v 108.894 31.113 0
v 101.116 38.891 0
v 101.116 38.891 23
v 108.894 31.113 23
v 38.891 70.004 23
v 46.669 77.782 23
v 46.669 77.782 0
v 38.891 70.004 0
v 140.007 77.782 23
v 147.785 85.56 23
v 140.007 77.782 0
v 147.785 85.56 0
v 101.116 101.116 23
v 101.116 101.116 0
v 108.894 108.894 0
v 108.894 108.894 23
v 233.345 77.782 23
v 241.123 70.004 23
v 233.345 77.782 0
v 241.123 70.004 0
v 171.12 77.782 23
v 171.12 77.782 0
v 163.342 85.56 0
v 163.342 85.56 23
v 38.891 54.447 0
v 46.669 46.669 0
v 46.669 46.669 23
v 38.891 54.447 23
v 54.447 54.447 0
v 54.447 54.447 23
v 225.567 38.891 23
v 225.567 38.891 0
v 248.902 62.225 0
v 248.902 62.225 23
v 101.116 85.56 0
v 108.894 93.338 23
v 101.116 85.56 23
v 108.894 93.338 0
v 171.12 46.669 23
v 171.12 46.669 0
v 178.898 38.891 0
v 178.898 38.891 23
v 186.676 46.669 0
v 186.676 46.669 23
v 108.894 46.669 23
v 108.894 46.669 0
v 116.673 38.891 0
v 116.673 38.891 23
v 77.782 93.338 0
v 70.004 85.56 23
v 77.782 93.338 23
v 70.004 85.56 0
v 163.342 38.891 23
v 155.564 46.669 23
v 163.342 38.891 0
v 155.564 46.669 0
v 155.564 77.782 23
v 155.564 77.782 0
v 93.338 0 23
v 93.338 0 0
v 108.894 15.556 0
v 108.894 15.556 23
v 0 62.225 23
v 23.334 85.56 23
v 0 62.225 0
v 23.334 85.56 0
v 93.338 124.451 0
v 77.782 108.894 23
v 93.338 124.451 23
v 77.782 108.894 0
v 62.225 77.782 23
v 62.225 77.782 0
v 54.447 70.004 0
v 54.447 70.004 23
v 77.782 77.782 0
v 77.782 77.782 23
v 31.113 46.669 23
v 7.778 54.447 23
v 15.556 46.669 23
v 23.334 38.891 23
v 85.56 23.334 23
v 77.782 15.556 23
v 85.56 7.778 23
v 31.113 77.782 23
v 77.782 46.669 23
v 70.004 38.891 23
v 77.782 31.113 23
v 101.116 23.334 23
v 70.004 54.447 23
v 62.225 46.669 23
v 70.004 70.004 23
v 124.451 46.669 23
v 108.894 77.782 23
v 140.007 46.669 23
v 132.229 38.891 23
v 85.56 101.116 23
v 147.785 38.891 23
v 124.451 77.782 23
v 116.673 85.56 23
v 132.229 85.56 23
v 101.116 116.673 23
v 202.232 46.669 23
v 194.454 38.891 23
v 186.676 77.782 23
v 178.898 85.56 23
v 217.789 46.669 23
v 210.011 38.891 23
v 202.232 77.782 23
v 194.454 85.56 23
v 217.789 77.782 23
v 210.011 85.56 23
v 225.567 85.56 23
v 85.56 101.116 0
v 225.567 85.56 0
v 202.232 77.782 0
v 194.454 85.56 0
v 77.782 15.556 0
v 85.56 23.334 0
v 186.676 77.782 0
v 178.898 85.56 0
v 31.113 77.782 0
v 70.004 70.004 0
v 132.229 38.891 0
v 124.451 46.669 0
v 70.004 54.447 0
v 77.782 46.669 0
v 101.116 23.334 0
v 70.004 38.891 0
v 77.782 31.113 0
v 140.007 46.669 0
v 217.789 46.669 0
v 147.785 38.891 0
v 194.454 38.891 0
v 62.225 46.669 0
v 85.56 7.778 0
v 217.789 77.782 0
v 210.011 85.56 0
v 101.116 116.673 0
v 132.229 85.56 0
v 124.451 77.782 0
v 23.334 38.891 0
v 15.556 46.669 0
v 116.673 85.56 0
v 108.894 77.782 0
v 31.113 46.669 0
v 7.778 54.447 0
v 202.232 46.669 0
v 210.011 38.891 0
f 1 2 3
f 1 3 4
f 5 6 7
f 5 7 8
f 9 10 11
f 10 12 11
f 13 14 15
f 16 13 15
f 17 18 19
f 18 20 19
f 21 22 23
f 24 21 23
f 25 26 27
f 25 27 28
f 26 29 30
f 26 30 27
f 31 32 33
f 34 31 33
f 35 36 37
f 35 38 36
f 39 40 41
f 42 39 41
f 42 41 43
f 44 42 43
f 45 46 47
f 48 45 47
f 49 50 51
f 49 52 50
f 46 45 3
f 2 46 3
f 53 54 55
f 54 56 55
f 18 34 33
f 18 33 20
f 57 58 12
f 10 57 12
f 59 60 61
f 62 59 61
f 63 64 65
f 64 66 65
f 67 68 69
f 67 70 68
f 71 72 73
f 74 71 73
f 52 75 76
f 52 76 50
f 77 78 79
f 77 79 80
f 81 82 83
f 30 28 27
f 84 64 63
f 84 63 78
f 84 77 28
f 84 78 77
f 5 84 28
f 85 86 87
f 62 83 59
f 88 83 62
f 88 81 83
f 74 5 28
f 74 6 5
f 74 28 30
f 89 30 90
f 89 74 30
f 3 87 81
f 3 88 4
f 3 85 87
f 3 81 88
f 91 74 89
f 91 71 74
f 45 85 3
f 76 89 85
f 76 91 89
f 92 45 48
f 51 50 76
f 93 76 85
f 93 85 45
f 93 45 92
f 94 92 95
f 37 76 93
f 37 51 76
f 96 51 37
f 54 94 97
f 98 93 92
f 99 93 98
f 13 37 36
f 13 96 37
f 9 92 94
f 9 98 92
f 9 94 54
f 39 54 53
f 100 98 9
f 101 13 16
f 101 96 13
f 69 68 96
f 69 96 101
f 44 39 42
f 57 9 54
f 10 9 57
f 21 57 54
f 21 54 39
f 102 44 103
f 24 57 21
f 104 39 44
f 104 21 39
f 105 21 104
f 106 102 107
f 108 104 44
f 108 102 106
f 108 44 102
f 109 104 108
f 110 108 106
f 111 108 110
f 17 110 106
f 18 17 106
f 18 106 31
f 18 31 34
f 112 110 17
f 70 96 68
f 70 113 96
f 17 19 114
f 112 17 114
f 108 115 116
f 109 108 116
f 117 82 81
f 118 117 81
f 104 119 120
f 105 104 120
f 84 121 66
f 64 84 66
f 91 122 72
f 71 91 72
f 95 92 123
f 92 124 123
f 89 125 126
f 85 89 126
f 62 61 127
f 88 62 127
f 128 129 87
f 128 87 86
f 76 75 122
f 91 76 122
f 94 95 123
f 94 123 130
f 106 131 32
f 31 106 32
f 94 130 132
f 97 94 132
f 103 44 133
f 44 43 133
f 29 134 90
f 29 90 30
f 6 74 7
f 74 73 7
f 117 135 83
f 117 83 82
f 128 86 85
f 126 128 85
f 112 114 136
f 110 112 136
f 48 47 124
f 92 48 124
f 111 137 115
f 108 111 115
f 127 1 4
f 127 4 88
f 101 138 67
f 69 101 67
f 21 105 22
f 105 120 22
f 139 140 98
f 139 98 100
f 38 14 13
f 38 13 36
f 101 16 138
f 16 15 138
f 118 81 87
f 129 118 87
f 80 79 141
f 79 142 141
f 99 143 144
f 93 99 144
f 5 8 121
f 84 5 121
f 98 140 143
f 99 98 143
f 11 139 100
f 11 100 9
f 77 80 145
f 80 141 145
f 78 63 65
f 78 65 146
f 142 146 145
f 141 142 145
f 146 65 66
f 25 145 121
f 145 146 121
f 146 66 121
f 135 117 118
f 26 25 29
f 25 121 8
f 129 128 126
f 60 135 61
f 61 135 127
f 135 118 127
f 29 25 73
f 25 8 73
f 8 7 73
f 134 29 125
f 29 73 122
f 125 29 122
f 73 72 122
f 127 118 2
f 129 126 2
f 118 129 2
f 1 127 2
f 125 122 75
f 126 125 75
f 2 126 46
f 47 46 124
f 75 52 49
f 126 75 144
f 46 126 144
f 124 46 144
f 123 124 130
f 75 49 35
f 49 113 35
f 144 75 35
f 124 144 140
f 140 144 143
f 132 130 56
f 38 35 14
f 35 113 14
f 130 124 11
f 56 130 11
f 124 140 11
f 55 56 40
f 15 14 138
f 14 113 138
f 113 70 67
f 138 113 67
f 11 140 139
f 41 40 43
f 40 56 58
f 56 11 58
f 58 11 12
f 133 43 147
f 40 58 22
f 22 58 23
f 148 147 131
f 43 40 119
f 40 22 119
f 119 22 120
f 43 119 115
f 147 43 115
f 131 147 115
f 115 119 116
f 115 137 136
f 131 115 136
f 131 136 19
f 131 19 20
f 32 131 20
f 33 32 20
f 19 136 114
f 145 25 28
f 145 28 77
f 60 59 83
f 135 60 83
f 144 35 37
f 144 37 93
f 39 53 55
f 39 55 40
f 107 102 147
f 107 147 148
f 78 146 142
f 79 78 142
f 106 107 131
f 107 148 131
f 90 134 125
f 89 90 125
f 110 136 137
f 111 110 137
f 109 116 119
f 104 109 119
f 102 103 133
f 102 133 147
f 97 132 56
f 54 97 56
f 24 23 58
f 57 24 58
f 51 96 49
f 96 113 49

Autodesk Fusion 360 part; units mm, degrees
sketch "big huge diamond sword" plane through (0, 0, 0) normal (0, 0, 1) x (1, 0, 0)
  line L0 (0, 62.2254) -> (7.7782, 54.4472)
  line L1 (7.7782, 54.4472) -> (15.5563, 62.2254)
  line L2 (15.5563, 62.2254) -> (7.7782, 70.0036)
  line L3 (7.7782, 70.0036) -> (0, 62.2254)
  line L4 (7.7782, 54.4472) -> (15.5563, 46.669)
  line L5 (15.5563, 46.669) -> (23.3345, 54.4472)
  line L6 (23.3345, 54.4472) -> (15.5563, 62.2254)
  line L7 (15.5563, 62.2254) -> (7.7782, 54.4472)
  line L8 (15.5563, 46.669) -> (23.3345, 38.8909)
  line L9 (23.3345, 38.8909) -> (31.1127, 46.669)
  line L10 (23.3345, 54.4472) -> (15.5563, 46.669)
  line L11 (7.7782, 70.0036) -> (15.5563, 62.2254)
  line L12 (15.5563, 62.2254) -> (23.3345, 70.0036)
  line L13 (23.3345, 70.0036) -> (15.5563, 77.7817)
  line L14 (15.5563, 77.7817) -> (7.7782, 70.0036)
  line L15 (23.3345, 70.0036) -> (31.1127, 62.2254)
  line L16 (31.1127, 62.2254) -> (23.3345, 54.4472)
  line L17 (23.3345, 54.4472) -> (15.5563, 62.2254)
  line L18 (15.5563, 62.2254) -> (23.3345, 70.0036)
  line L19 (15.5563, 77.7817) -> (23.3345, 70.0036)
  line L20 (23.3345, 70.0036) -> (31.1127, 77.7817)
  line L21 (31.1127, 77.7817) -> (23.3345, 85.5599)
  line L22 (23.3345, 85.5599) -> (15.5563, 77.7817)
  line L23 (23.3345, 70.0036) -> (31.1127, 62.2254)
  line L24 (31.1127, 62.2254) -> (38.8909, 70.0036)
  line L25 (38.8909, 70.0036) -> (31.1127, 77.7817)
  line L26 (31.1127, 77.7817) -> (23.3345, 70.0036)
  line L27 (31.1127, 62.2254) -> (38.8909, 54.4472)
  line L28 (38.8909, 54.4472) -> (31.1127, 46.669)
  line L29 (31.1127, 46.669) -> (23.3345, 54.4472)
  line L30 (23.3345, 54.4472) -> (31.1127, 62.2254)
  line L31 (31.1127, 62.2254) -> (38.8909, 54.4472)
  line L32 (38.8909, 54.4472) -> (46.669, 62.2254)
  line L33 (46.669, 62.2254) -> (38.8909, 70.0036)
  line L34 (38.8909, 70.0036) -> (31.1127, 62.2254)
  line L35 (38.8909, 70.0036) -> (46.669, 62.2254)
  line L36 (46.669, 62.2254) -> (54.4472, 70.0036)
  line L37 (54.4472, 70.0036) -> (46.669, 77.7817)
  line L38 (46.669, 77.7817) -> (38.8909, 70.0036)
  line L39 (46.669, 62.2254) -> (54.4472, 54.4472)
  line L40 (54.4472, 54.4472) -> (46.669, 46.669)
  line L41 (46.669, 46.669) -> (38.8909, 54.4472)
  line L42 (38.8909, 54.4472) -> (46.669, 62.2254)
  line L43 (46.669, 62.2254) -> (54.4472, 54.4472)
  line L44 (54.4472, 54.4472) -> (62.2254, 62.2254)
  line L45 (62.2254, 62.2254) -> (54.4472, 70.0036)
  line L46 (54.4472, 70.0036) -> (46.669, 62.2254)
  line L47 (54.4472, 70.0036) -> (62.2254, 62.2254)
  line L48 (62.2254, 62.2254) -> (70.0036, 70.0036)
  line L49 (70.0036, 70.0036) -> (62.2254, 77.7817)
  line L50 (62.2254, 77.7817) -> (54.4472, 70.0036)
  line L51 (62.2254, 62.2254) -> (70.0036, 54.4472)
  line L52 (62.2254, 46.669) -> (54.4472, 54.4472)
  line L53 (54.4472, 54.4472) -> (62.2254, 62.2254)
  line L54 (62.2254, 62.2254) -> (70.0036, 54.4472)
  line L55 (70.0036, 54.4472) -> (77.7817, 62.2254)
  line L56 (77.7817, 62.2254) -> (70.0036, 70.0036)
  line L57 (70.0036, 70.0036) -> (62.2254, 62.2254)
  line L58 (70.0036, 70.0036) -> (77.7817, 62.2254)
  line L59 (77.7817, 62.2254) -> (85.5599, 70.0036)
  line L60 (85.5599, 70.0036) -> (77.7817, 77.7817)
  line L61 (77.7817, 77.7817) -> (70.0036, 70.0036)
  line L62 (77.7817, 77.7817) -> (70.0036, 85.5599)
  line L63 (70.0036, 85.5599) -> (77.7817, 93.3381)
  line L64 (77.7817, 93.3381) -> (85.5599, 85.5599)
  line L65 (85.5599, 85.5599) -> (77.7817, 77.7817)
  line L66 (77.7817, 93.3381) -> (85.5599, 85.5599)
  line L67 (85.5599, 85.5599) -> (93.3381, 93.3381)
  line L68 (93.3381, 93.3381) -> (85.5599, 101.1163)
  line L69 (85.5599, 101.1163) -> (77.7817, 93.3381)
  line L70 (85.5599, 101.1163) -> (77.7817, 108.8944)
  line L71 (77.7817, 108.8944) -> (85.5599, 116.6726)
  line L72 (85.5599, 116.6726) -> (93.3381, 108.8944)
  line L73 (93.3381, 108.8944) -> (85.5599, 101.1163)
  line L74 (85.5599, 116.6726) -> (93.3381, 108.8944)
  line L75 (93.3381, 108.8944) -> (101.1163, 116.6726)
  line L76 (101.1163, 116.6726) -> (93.3381, 124.4508)
  line L77 (93.3381, 124.4508) -> (85.5599, 116.6726)
  line L78 (93.3381, 108.8944) -> (101.1163, 101.1163)
  line L79 (101.1163, 101.1163) -> (108.8944, 108.8944)
  line L80 (108.8944, 108.8944) -> (101.1163, 116.6726)
  line L81 (101.1163, 116.6726) -> (93.3381, 108.8944)
  line L82 (85.5599, 101.1163) -> (93.3381, 93.3381)
  line L83 (93.3381, 93.3381) -> (101.1163, 101.1163)
  line L84 (101.1163, 101.1163) -> (93.3381, 108.8944)
  line L85 (93.3381, 108.8944) -> (85.5599, 101.1163)
  line L86 (101.1163, 101.1163) -> (108.8944, 93.3381)
  line L87 (108.8944, 93.3381) -> (101.1163, 85.5599)
  line L88 (101.1163, 85.5599) -> (93.3381, 93.3381)
  line L89 (93.3381, 93.3381) -> (101.1163, 101.1163)
  line L90 (93.3381, 93.3381) -> (101.1163, 85.5599)
  line L91 (101.1163, 85.5599) -> (93.3381, 77.7817)
  line L92 (93.3381, 77.7817) -> (85.5599, 85.5599)
  line L93 (85.5599, 85.5599) -> (93.3381, 93.3381)
  line L94 (77.7817, 77.7817) -> (85.5599, 70.0036)
  line L95 (85.5599, 70.0036) -> (93.3381, 77.7817)
  line L96 (93.3381, 77.7817) -> (85.5599, 85.5599)
  line L97 (85.5599, 85.5599) -> (77.7817, 77.7817)
  line L98 (70.0036, 54.4472) -> (77.7817, 46.669)
  line L99 (62.2254, 46.669) -> (70.0036, 54.4472)
  line L100 (77.7817, 62.2254) -> (85.5599, 54.4472)
  line L101 (85.5599, 54.4472) -> (77.7817, 46.669)
  line L102 (70.0036, 54.4472) -> (77.7817, 62.2254)
  line L103 (85.5599, 70.0036) -> (93.3381, 62.2254)
  line L104 (93.3381, 62.2254) -> (85.5599, 54.4472)
  line L105 (85.5599, 54.4472) -> (77.7817, 62.2254)
  line L106 (77.7817, 62.2254) -> (85.5599, 70.0036)
  line L107 (77.7817, 46.669) -> (85.5599, 38.8909)
  line L108 (85.5599, 38.8909) -> (77.7817, 31.1127)
  line L109 (77.7817, 31.1127) -> (70.0036, 38.8909)
  line L110 (70.0036, 38.8909) -> (77.7817, 46.669)
  line L111 (77.7817, 46.669) -> (85.5599, 38.8909)
  line L112 (85.5599, 38.8909) -> (93.3381, 46.669)
  line L113 (93.3381, 46.669) -> (85.5599, 54.4472)
  line L114 (85.5599, 54.4472) -> (77.7817, 46.669)
  line L115 (85.5599, 38.8909) -> (93.3381, 31.1127)
  line L116 (93.3381, 31.1127) -> (85.5599, 23.3345)
  line L117 (85.5599, 23.3345) -> (77.7817, 31.1127)
  line L118 (77.7817, 31.1127) -> (85.5599, 38.8909)
  line L119 (85.5599, 23.3345) -> (93.3381, 15.5563)
  line L120 (93.3381, 15.5563) -> (101.1163, 23.3345)
  line L121 (101.1163, 23.3345) -> (93.3381, 31.1127)
  line L122 (93.3381, 31.1127) -> (85.5599, 23.3345)
  line L123 (93.3381, 15.5563) -> (101.1163, 7.7782)
  line L124 (101.1163, 7.7782) -> (108.8944, 15.5563)
  line L125 (108.8944, 15.5563) -> (101.1163, 23.3345)
  line L126 (101.1163, 23.3345) -> (93.3381, 15.5563)
  line L127 (85.5599, 23.3345) -> (93.3381, 15.5563)
  line L128 (93.3381, 15.5563) -> (85.5599, 7.7782)
  line L129 (85.5599, 7.7782) -> (77.7817, 15.5563)
  line L130 (77.7817, 15.5563) -> (85.5599, 23.3345)
  line L131 (93.3381, 15.5563) -> (101.1163, 7.7782)
  line L132 (101.1163, 7.7782) -> (93.3381, 0)
  line L133 (93.3381, 0) -> (85.5599, 7.7782)
  line L134 (85.5599, 7.7782) -> (93.3381, 15.5563)
  line L135 (93.3381, 77.7817) -> (101.1163, 70.0036)
  line L136 (101.1163, 70.0036) -> (93.3381, 62.2254)
  line L137 (93.3381, 62.2254) -> (85.5599, 70.0036)
  line L138 (85.5599, 70.0036) -> (93.3381, 77.7817)
  line L139 (93.3381, 62.2254) -> (101.1163, 54.4472)
  line L140 (101.1163, 54.4472) -> (93.3381, 46.669)
  line L141 (93.3381, 46.669) -> (85.5599, 54.4472)
  line L142 (85.5599, 54.4472) -> (93.3381, 62.2254)
  line L143 (101.1163, 85.5599) -> (108.8944, 77.7817)
  line L144 (108.8944, 77.7817) -> (101.1163, 70.0036)
  line L145 (101.1163, 70.0036) -> (93.3381, 77.7817)
  line L146 (93.3381, 77.7817) -> (101.1163, 85.5599)
  line L147 (101.1163, 70.0036) -> (108.8944, 62.2254)
  line L148 (108.8944, 62.2254) -> (101.1163, 54.4472)
  line L149 (101.1163, 54.4472) -> (93.3381, 62.2254)
  line L150 (93.3381, 62.2254) -> (101.1163, 70.0036)
  line L151 (108.8944, 77.7817) -> (116.6726, 70.0036)
  line L152 (116.6726, 70.0036) -> (108.8944, 62.2254)
  line L153 (108.8944, 62.2254) -> (101.1163, 70.0036)
  line L154 (101.1163, 70.0036) -> (108.8944, 77.7817)
  line L155 (93.3381, 46.669) -> (101.1163, 38.8909)
  line L156 (101.1163, 38.8909) -> (93.3381, 31.1127)
  line L157 (93.3381, 31.1127) -> (85.5599, 38.8909)
  line L158 (85.5599, 38.8909) -> (93.3381, 46.669)
  line L159 (101.1163, 38.8909) -> (108.8944, 31.1127)
  line L160 (108.8944, 31.1127) -> (101.1163, 23.3345)
  line L161 (101.1163, 23.3345) -> (93.3381, 31.1127)
  line L162 (93.3381, 31.1127) -> (101.1163, 38.8909)
  line L163 (101.1163, 54.4472) -> (108.8944, 46.669)
  line L164 (108.8944, 46.669) -> (101.1163, 38.8909)
  line L165 (101.1163, 38.8909) -> (93.3381, 46.669)
  line L166 (93.3381, 46.669) -> (101.1163, 54.4472)
  line L167 (108.8944, 62.2254) -> (116.6726, 54.4472)
  line L168 (116.6726, 54.4472) -> (108.8944, 46.669)
  line L169 (108.8944, 46.669) -> (101.1163, 54.4472)
  line L170 (101.1163, 54.4472) -> (108.8944, 62.2254)
  line L171 (108.8944, 46.669) -> (101.1163, 54.4472)
  line L172 (101.1163, 54.4472) -> (108.8944, 62.2254)
  line L173 (108.8944, 62.2254) -> (116.6726, 54.4472)
  line L174 (116.6726, 54.4472) -> (108.8944, 46.669)
  line L175 (108.8944, 46.669) -> (116.6726, 38.8909)
  line L176 (116.6726, 38.8909) -> (124.4508, 46.669)
  line L177 (124.4508, 46.669) -> (116.6726, 54.4472)
  line L178 (116.6726, 54.4472) -> (108.8944, 46.669)
  line L179 (108.8944, 62.2254) -> (116.6726, 54.4472)
  line L180 (116.6726, 54.4472) -> (124.4508, 62.2254)
  line L181 (124.4508, 62.2254) -> (116.6726, 70.0036)
  line L182 (116.6726, 70.0036) -> (108.8944, 62.2254)
  line L183 (116.6726, 54.4472) -> (124.4508, 46.669)
  line L184 (124.4508, 46.669) -> (132.229, 54.4472)
  line L185 (132.229, 54.4472) -> (124.4508, 62.2254)
  line L186 (124.4508, 62.2254) -> (116.6726, 54.4472)
  line L187 (124.4508, 46.669) -> (132.229, 38.8909)
  line L188 (132.229, 38.8909) -> (140.0071, 46.669)
  line L189 (140.0071, 46.669) -> (132.229, 54.4472)
  line L190 (132.229, 54.4472) -> (124.4508, 46.669)
  line L191 (108.8944, 77.7817) -> (116.6726, 70.0036)
  line L192 (116.6726, 70.0036) -> (124.4508, 77.7817)
  line L193 (124.4508, 77.7817) -> (116.6726, 85.5599)
  line L194 (116.6726, 85.5599) -> (108.8944, 77.7817)
  line L195 (116.6726, 70.0036) -> (124.4508, 62.2254)
  line L196 (124.4508, 62.2254) -> (132.229, 70.0036)
  line L197 (132.229, 70.0036) -> (124.4508, 77.7817)
  line L198 (124.4508, 77.7817) -> (116.6726, 70.0036)
  line L199 (132.229, 70.0036) -> (124.4508, 77.7817)
  line L200 (124.4508, 77.7817) -> (132.229, 85.5599)
  line L201 (132.229, 85.5599) -> (140.0071, 77.7817)
  line L202 (140.0071, 77.7817) -> (132.229, 70.0036)
  line L203 (124.4508, 62.2254) -> (132.229, 54.4472)
  line L204 (132.229, 54.4472) -> (140.0071, 62.2254)
  line L205 (140.0071, 62.2254) -> (132.229, 70.0036)
  line L206 (132.229, 70.0036) -> (124.4508, 62.2254)
  line L207 (132.229, 70.0036) -> (140.0071, 62.2254)
  line L208 (140.0071, 62.2254) -> (147.7853, 70.0036)
  line L209 (147.7853, 70.0036) -> (140.0071, 77.7817)
  line L210 (140.0071, 77.7817) -> (132.229, 70.0036)
  line L211 (132.229, 54.4472) -> (140.0071, 46.669)
  line L212 (140.0071, 46.669) -> (147.7853, 54.4472)
  line L213 (147.7853, 54.4472) -> (140.0071, 62.2254)
  line L214 (140.0071, 62.2254) -> (132.229, 54.4472)
  line L215 (140.0071, 77.7817) -> (147.7853, 70.0036)
  line L216 (147.7853, 70.0036) -> (155.5635, 77.7817)
  line L217 (155.5635, 77.7817) -> (147.7853, 85.5599)
  line L218 (147.7853, 85.5599) -> (140.0071, 77.7817)
  line L219 (140.0071, 46.669) -> (147.7853, 38.8909)
  line L220 (147.7853, 38.8909) -> (155.5635, 46.669)
  line L221 (155.5635, 46.669) -> (147.7853, 54.4472)
  line L222 (147.7853, 54.4472) -> (140.0071, 46.669)
  line L223 (140.0071, 62.2254) -> (147.7853, 54.4472)
  line L224 (147.7853, 54.4472) -> (155.5635, 62.2254)
  line L225 (155.5635, 62.2254) -> (147.7853, 70.0036)
  line L226 (147.7853, 70.0036) -> (140.0071, 62.2254)
  line L227 (155.5635, 62.2254) -> (163.3417, 54.4472)
  line L228 (163.3417, 54.4472) -> (171.1198, 62.2254)
  line L229 (171.1198, 62.2254) -> (163.3417, 70.0036)
  line L230 (163.3417, 70.0036) -> (155.5635, 62.2254)
  line L231 (155.5635, 62.2254) -> (147.7853, 70.0036)
  line L232 (147.7853, 70.0036) -> (155.5635, 77.7817)
  line L233 (155.5635, 77.7817) -> (163.3417, 70.0036)
  line L234 (163.3417, 70.0036) -> (155.5635, 62.2254)
  line L235 (155.5635, 62.2254) -> (163.3417, 54.4472)
  line L236 (163.3417, 54.4472) -> (155.5635, 46.669)
  line L237 (155.5635, 46.669) -> (147.7853, 54.4472)
  line L238 (147.7853, 54.4472) -> (155.5635, 62.2254)
  line L239 (155.5635, 77.7817) -> (163.3417, 70.0036)
  line L240 (163.3417, 70.0036) -> (171.1198, 77.7817)
  line L241 (171.1198, 77.7817) -> (163.3417, 85.5599)
  line L242 (163.3417, 85.5599) -> (155.5635, 77.7817)
  line L243 (163.3417, 70.0036) -> (171.1198, 62.2254)
  line L244 (171.1198, 62.2254) -> (178.898, 70.0036)
  line L245 (178.898, 70.0036) -> (171.1198, 77.7817)
  line L246 (171.1198, 77.7817) -> (163.3417, 70.0036)
  line L247 (155.5635, 46.669) -> (163.3417, 38.8909)
  line L248 (163.3417, 38.8909) -> (171.1198, 46.669)
  line L249 (171.1198, 46.669) -> (163.3417, 54.4472)
  line L250 (163.3417, 54.4472) -> (155.5635, 46.669)
  line L251 (163.3417, 54.4472) -> (171.1198, 46.669)
  line L252 (171.1198, 46.669) -> (178.898, 54.4472)
  line L253 (178.898, 54.4472) -> (171.1198, 62.2254)
  line L254 (171.1198, 62.2254) -> (163.3417, 54.4472)
  line L255 (171.1198, 62.2254) -> (178.898, 54.4472)
  line L256 (178.898, 54.4472) -> (186.6762, 62.2254)
  line L257 (186.6762, 62.2254) -> (178.898, 70.0036)
  line L258 (178.898, 70.0036) -> (171.1198, 62.2254)
  line L259 (171.1198, 77.7817) -> (178.898, 70.0036)
  line L260 (178.898, 70.0036) -> (186.6762, 77.7817)
  line L261 (186.6762, 77.7817) -> (178.898, 85.5599)
  line L262 (178.898, 85.5599) -> (171.1198, 77.7817)
  line L263 (171.1198, 46.669) -> (178.898, 38.8909)
  line L264 (178.898, 38.8909) -> (186.6762, 46.669)
  line L265 (186.6762, 46.669) -> (178.898, 54.4472)
  line L266 (178.898, 54.4472) -> (171.1198, 46.669)
  line L267 (178.898, 70.0036) -> (186.6762, 62.2254)
  line L268 (186.6762, 62.2254) -> (194.4544, 70.0036)
  line L269 (194.4544, 70.0036) -> (186.6762, 77.7817)
  line L270 (186.6762, 77.7817) -> (178.898, 70.0036)
  line L271 (178.898, 54.4472) -> (186.6762, 46.669)
  line L272 (186.6762, 46.669) -> (194.4544, 54.4472)
  line L273 (194.4544, 54.4472) -> (186.6762, 62.2254)
  line L274 (186.6762, 62.2254) -> (178.898, 54.4472)
  line L275 (186.6762, 62.2254) -> (194.4544, 54.4472)
  line L276 (194.4544, 54.4472) -> (202.2325, 62.2254)
  line L277 (202.2325, 62.2254) -> (194.4544, 70.0036)
  line L278 (194.4544, 70.0036) -> (186.6762, 62.2254)
  line L279 (186.6762, 46.669) -> (194.4544, 38.8909)
  line L280 (194.4544, 38.8909) -> (202.2325, 46.669)
  line L281 (202.2325, 46.669) -> (194.4544, 54.4472)
  line L282 (194.4544, 54.4472) -> (186.6762, 46.669)
  line L283 (186.6762, 77.7817) -> (194.4544, 70.0036)
  line L284 (194.4544, 70.0036) -> (202.2325, 77.7817)
  line L285 (202.2325, 77.7817) -> (194.4544, 85.5599)
  line L286 (194.4544, 85.5599) -> (186.6762, 77.7817)
  line L287 (202.2325, 62.2254) -> (210.0107, 54.4472)
  line L288 (210.0107, 54.4472) -> (202.2325, 46.669)
  line L289 (202.2325, 46.669) -> (194.4544, 54.4472)
  line L290 (194.4544, 54.4472) -> (202.2325, 62.2254)
  line L291 (194.4544, 70.0036) -> (202.2325, 62.2254)
  line L292 (202.2325, 62.2254) -> (210.0107, 70.0036)
  line L293 (210.0107, 70.0036) -> (202.2325, 77.7817)
  line L294 (202.2325, 77.7817) -> (194.4544, 70.0036)
  line L295 (202.2325, 62.2254) -> (210.0107, 54.4472)
  line L296 (210.0107, 54.4472) -> (217.7889, 62.2254)
  line L297 (217.7889, 62.2254) -> (210.0107, 70.0036)
  line L298 (210.0107, 70.0036) -> (202.2325, 62.2254)
  line L299 (202.2325, 46.669) -> (210.0107, 38.8909)
  line L300 (210.0107, 38.8909) -> (217.7889, 46.669)
  line L301 (217.7889, 46.669) -> (210.0107, 54.4472)
  line L302 (210.0107, 54.4472) -> (202.2325, 46.669)
  line L303 (202.2325, 77.7817) -> (210.0107, 70.0036)
  line L304 (210.0107, 70.0036) -> (217.7889, 77.7817)
  line L305 (217.7889, 77.7817) -> (210.0107, 85.5599)
  line L306 (210.0107, 85.5599) -> (202.2325, 77.7817)
  line L307 (217.7889, 77.7817) -> (225.5671, 70.0036)
  line L308 (225.5671, 70.0036) -> (217.7889, 62.2254)
  line L309 (217.7889, 62.2254) -> (210.0107, 70.0036)
  line L310 (210.0107, 70.0036) -> (217.7889, 77.7817)
  line L311 (210.0107, 54.4472) -> (217.7889, 46.669)
  line L312 (217.7889, 46.669) -> (225.5671, 54.4472)
  line L313 (225.5671, 54.4472) -> (217.7889, 62.2254)
  line L314 (217.7889, 62.2254) -> (210.0107, 54.4472)
  line L315 (217.7889, 62.2254) -> (225.5671, 54.4472)
  line L316 (225.5671, 54.4472) -> (233.3452, 62.2254)
  line L317 (233.3452, 62.2254) -> (225.5671, 70.0036)
  line L318 (225.5671, 70.0036) -> (217.7889, 62.2254)
  line L319 (217.7889, 77.7817) -> (225.5671, 70.0036)
  line L320 (225.5671, 70.0036) -> (233.3452, 77.7817)
  line L321 (233.3452, 77.7817) -> (225.5671, 85.5599)
  line L322 (225.5671, 85.5599) -> (217.7889, 77.7817)
  line L323 (225.5671, 70.0036) -> (233.3452, 62.2254)
  line L324 (233.3452, 62.2254) -> (241.1234, 70.0036)
  line L325 (241.1234, 70.0036) -> (233.3452, 77.7817)
  line L326 (233.3452, 77.7817) -> (225.5671, 70.0036)
  line L327 (217.7889, 46.669) -> (225.5671, 38.8909)
  line L328 (225.5671, 38.8909) -> (233.3452, 46.669)
  line L329 (233.3452, 46.669) -> (225.5671, 54.4472)
  line L330 (225.5671, 54.4472) -> (217.7889, 46.669)
  line L331 (225.5671, 54.4472) -> (233.3452, 46.669)
  line L332 (233.3452, 46.669) -> (241.1234, 54.4472)
  line L333 (241.1234, 54.4472) -> (233.3452, 62.2254)
  line L334 (233.3452, 62.2254) -> (225.5671, 54.4472)
  line L335 (233.3452, 62.2254) -> (225.5671, 70.0036)
  line L336 (225.5671, 70.0036) -> (233.3452, 77.7817)
  line L337 (233.3452, 77.7817) -> (241.1234, 70.0036)
  line L338 (241.1234, 70.0036) -> (233.3452, 62.2254)
  line L339 (233.3452, 62.2254) -> (241.1234, 54.4472)
  line L340 (241.1234, 54.4472) -> (248.9016, 62.2254)
  line L341 (248.9016, 62.2254) -> (241.1234, 70.0036)
  line L342 (241.1234, 70.0036) -> (233.3452, 62.2254)
  circle A0 centre (10, 10) radius 2.05
  circle A1 centre (200, 10) radius 2.05
  line L343 (0, 62.2254) -> (248.9016, 62.2254) construction
  circle A2 centre (200, 114.4508) radius 2.05
  point P0 (10, 114.4508)
  dimension "d249" = 11
  dimension "d250" = 11
  dimension "d251" = 11
  dimension "d252" = 11
  dimension "d253" = 11
  dimension "d254" = 11
  dimension "d255" = 11
  dimension "d256" = 11
  dimension "d261" = 11
  dimension "d262" = 11
  dimension "d263" = 11
  dimension "d264" = 11
  dimension "d265" = 11
  dimension "d266" = 11
  dimension "d267" = 11
  dimension "d268" = 11
  dimension "d271" = 11
  dimension "d272" = 11
  dimension "d273" = 11
  dimension "d274" = 11
  dimension "d275" = 11
  dimension "d276" = 11
  dimension "d277" = 11
  dimension "d278" = 11
  dimension "d279" = 11
  dimension "d280" = 11
  dimension "d281" = 11
  dimension "d282" = 11
  dimension "d283" = 11
  dimension "d284" = 11
  dimension "d285" = 11
  dimension "d286" = 11
  dimension "d287" = 11
  dimension "d288" = 11
  dimension "d289" = 11
  dimension "d290" = 11
  dimension "d291" = 11
  dimension "d292" = 11
  dimension "d293" = 11
  dimension "d294" = 11
  dimension "d295" = 11
  dimension "d296" = 11
  dimension "d297" = 11
  dimension "d298" = 11
  dimension "d299" = 11
  dimension "d300" = 11
  dimension "d301" = 11
  dimension "d302" = 11
  dimension "d303" = 11
  dimension "d304" = 11
  dimension "d309" = 11
  dimension "d310" = 11
  dimension "d311" = 11
  dimension "d312" = 11
  dimension "d313" = 11
  dimension "d314" = 11
  dimension "d315" = 11
  dimension "d316" = 11
  dimension "d319" = 11
  dimension "d320" = 11
  dimension "d321" = 11
  dimension "d322" = 11
  dimension "d323" = 11
  dimension "d324" = 11
  dimension "d325" = 11
  dimension "d326" = 11
  dimension "d327" = 11
  dimension "d328" = 11
  dimension "d329" = 11
  dimension "d330" = 11
  dimension "d331" = 11
  dimension "d332" = 11
  dimension "d333" = 11
  dimension "d334" = 11
  dimension "d335" = 11
  dimension "d336" = 11
  dimension "d337" = 11
  dimension "d338" = 11
  dimension "d339" = 11
  dimension "d340" = 11
  dimension "d341" = 11
  dimension "d342" = 11
  dimension "d343" = 11
  dimension "d344" = 11
  dimension "d345" = 11
  dimension "d346" = 11
  dimension "d347" = 11
  dimension "d348" = 11
  dimension "d349" = 11
  dimension "d350" = 11
  dimension "d351" = 11
  dimension "d352" = 11
  dimension "d353" = 11
  dimension "d354" = 11
  dimension "d355" = 11
  dimension "d356" = 11
  dimension "d357" = 11
  dimension "d358" = 11
  dimension "d359" = 11
  dimension "d360" = 11
  dimension "d361" = 11
  dimension "d362" = 11
  dimension "d363" = 11
  dimension "d364" = 11
  dimension "d365" = 11
  dimension "d366" = 11
  dimension "d367" = 11
  dimension "d368" = 11
  dimension "d369" = 11
  dimension "d370" = 11
  dimension "d371" = 11
  dimension "d372" = 11
  dimension "d373" = 11
  dimension "d374" = 11
  dimension "d375" = 11
  dimension "d376" = 11
  dimension "d377" = 11
  dimension "d378" = 11
  dimension "d379" = 11
  dimension "d380" = 11
  dimension "d381" = 11
  dimension "d382" = 11
  dimension "d383" = 11
  dimension "d384" = 11
  dimension "d385" = 11
  dimension "d386" = 11
  dimension "d387" = 11
  dimension "d388" = 11
  dimension "d389" = 11
  dimension "d390" = 11
  dimension "d391" = 11
  dimension "d392" = 11
  dimension "d393" = 11
  dimension "d394" = 11
  dimension "d395" = 11
  dimension "d396" = 11
  dimension "d397" = 11
  dimension "d398" = 11
  dimension "d399" = 11
  dimension "d400" = 11
  dimension "d401" = 11
  dimension "d402" = 11
  dimension "d403" = 11
  dimension "d404" = 11
  dimension "d405" = 11
  dimension "d406" = 11
  dimension "d407" = 11
  dimension "d408" = 11
  dimension "d409" = 11
  dimension "d410" = 11
  dimension "d411" = 11
  dimension "d412" = 11
  dimension "d413" = 11
  dimension "d414" = 11
  dimension "d415" = 11
  dimension "d416" = 11
  dimension "d417" = 11
  dimension "d418" = 11
  dimension "d419" = 11
  dimension "d420" = 11
  dimension "d421" = 11
  dimension "d422" = 11
  dimension "d423" = 11
  dimension "d424" = 11
  dimension "d425" = 11
  dimension "d426" = 11
  dimension "d427" = 11
  dimension "d428" = 11
  dimension "d429" = 11
  dimension "d430" = 11
  dimension "d431" = 11
  dimension "d432" = 11
  dimension "d433" = 11
  dimension "d434" = 11
  dimension "d453" = 4.1
  dimension "d454" = 4.1
  dimension "d455" = 10
  dimension "d456" = 200
  dimension "d457" = 10
sketch "board prepare" plane through (0, 0, 0) normal (0, 0, 1) x (1, 0, 0)
  line L0 (219.2031, -219.2031) -> (306.8843, -131.5219)
  dimension "d437" = 310
extrude "Extrude13" add sketch "big huge diamond sword" along normal blind 23 contours L0 L1 L2 L3 L7 L11 | L1 L4 L5 L6 L7 L10 L17 | L2 L11 L12 L13 L14 L18 L19 | L6 L12 L15 L16 L17 L18 L23 L30 | L5 L8 L9 L10 L29 | L13 L19 L20 L21 L22 L26 | L16 L27 L28 L29 L30 L31 | L15 L20 L23 L24 L25 L26 L34 | L24 L27 L31 L32 L33 L34 L35 L42 | L33 L35 L36 L37 L38 L46 | L32 L39 L40 L41 L42 L43 | L36 L39 L43 L44 L45 L46 L47 L53 | L45 L47 L48 L49 L50 L57 | L44 L51 L52 L53 L54 L99 | L48 L51 L54 L55 L56 L57 L58 L102 | L56 L58 L59 L60 L61 L94 L106 | L55 L98 L100 L101 L102 L105 L114 | L59 L100 L103 L104 L105 L106 L137 L142 | L60 L65 L92 L94 L95 L96 L97 L138 | L62 L63 L64 L65 L66 L97 | L101 L107 L111 L112 L113 L114 L141 L158 | L107 L108 L109 L110 L111 L118 | L95 L103 L135 L136 L137 L138 L145 L150 | L104 L113 L139 L140 L141 L142 L149 L166 | L64 L66 L67 L68 L69 L82 L93 | L67 L88 L90 L91 L92 L93 L96 L146 | L108 L115 L116 L117 L118 L122 L157 | L112 L115 L155 L156 L157 L158 L162 L165 | L91 L135 L143 L144 L145 L146 L154 | L136 L139 L147 L148 L149 L150 L153 L170 L172 | L140 L155 L163 L164 L165 L166 L169 L171 | L68 L73 L78 L82 L83 L84 L85 L89 | L83 L86 L87 L88 L89 L90 | L116 L119 L120 L121 L122 L126 L127 L161 | L121 L156 L159 L160 L161 L162 | L144 L147 L151 L152 L153 L154 L182 L191 | L148 L163 L167 L168 L169 L170 L171 L172 L173 L174 L178 L179 | L70 L71 L72 L73 L74 L85 | L75 L78 L79 L80 L81 L84 | L119 L127 L128 L129 L130 L134 | L120 L123 L124 L125 L126 L131 | L151 L191 L192 L193 L194 L198 | L152 L167 L173 L179 L180 L181 L182 L186 L195 | L168 L174 L175 L176 L177 L178 L183 | L72 L74 L75 L76 L77 L81 | L123 L128 L131 L132 L133 L134 | L181 L192 L195 L196 L197 L198 L199 L206 | L177 L180 L183 L184 L185 L186 L190 L203 | L185 L196 L203 L204 L205 L206 L207 L214 | L197 L199 L200 L201 L202 L210 | L184 L187 L188 L189 L190 L211 | L189 L204 L211 L212 L213 L214 L222 L223 | L202 L205 L207 L208 L209 L210 L215 L226 | L212 L219 L220 L221 L222 L237 | L208 L213 L223 L224 L225 L226 L231 L238 | L209 L215 L216 L217 L218 L232 | L221 L224 L227 L235 L236 L237 L238 L250 | L216 L225 L230 L231 L232 L233 L234 L239 | L236 L247 L248 L249 L250 L251 | L227 L228 L229 L230 L234 L235 L243 L254 | L233 L239 L240 L241 L242 L246 | L228 L249 L251 L252 L253 L254 L255 L266 | L229 L240 L243 L244 L245 L246 L258 L259 | L244 L253 L255 L256 L257 L258 L267 L274 | L252 L263 L264 L265 L266 L271 | L245 L259 L260 L261 L262 L270 | L257 L260 L267 L268 L269 L270 L278 L283 | L256 L265 L271 L272 L273 L274 L275 L282 | L268 L273 L275 L276 L277 L278 L290 L291 | L269 L283 L284 L285 L286 L294 | L272 L279 L280 L281 L282 L289 | L277 L284 L291 L292 L293 L294 L298 L303 | L276 L281 L287 L288 L289 L290 L295 L302 | L287 L292 L295 L296 L297 L298 L309 L314 | L293 L303 L304 L305 L306 L310 | L288 L299 L300 L301 L302 L311 | L296 L301 L311 L312 L313 L314 L315 L330 | L297 L304 L307 L308 L309 L310 L318 L319 | L308 L313 L315 L316 L317 L318 L323 L334 L335 | L312 L327 L328 L329 L330 L331 | L307 L319 L320 L321 L322 L326 L336 | L317 L320 L323 L324 L325 L326 L335 L336 L337 L338 L342 | L316 L329 L331 L332 L333 L334 L339 | L324 L333 L338 L339 L340 L341 L342
equation "d = 11 mm"
equation "StockHeight = 23 mm"
equation "d249 = d"
equation "d250 = d"
equation "d251 = d"
equation "d252 = d"
equation "d253 = d"
equation "d254 = d"
equation "d255 = d"
equation "d256 = d"
equation "d261 = d"
equation "d262 = d"
equation "d263 = d"
equation "d264 = d"
equation "d265 = d"
equation "d266 = d"
equation "d267 = d"
equation "d268 = d"
equation "d271 = d"
equation "d272 = d"
equation "d273 = d"
equation "d274 = d"
equation "d275 = d"
equation "d276 = d"
equation "d277 = d"
equation "d278 = d"
equation "d279 = d"
equation "d280 = d"
equation "d281 = d"
equation "d282 = d"
equation "d283 = d"
equation "d284 = d"
equation "d285 = d"
equation "d286 = d"
equation "d287 = d"
equation "d288 = d"
equation "d289 = d"
equation "d290 = d"
equation "d291 = d"
equation "d292 = d"
equation "d293 = d"
equation "d294 = d"
equation "d295 = d"
equation "d296 = d"
equation "d297 = d"
equation "d298 = d"
equation "d299 = d"
equation "d300 = d"
equation "d301 = d"
equation "d302 = d"
equation "d303 = d"
equation "d304 = d"
equation "d309 = d"
equation "d310 = d"
equation "d311 = d"
equation "d312 = d"
equation "d313 = d"
equation "d314 = d"
equation "d315 = d"
equation "d316 = d"
equation "d319 = d"
equation "d320 = d"
equation "d321 = d"
equation "d322 = d"
equation "d323 = d"
equation "d324 = d"
equation "d325 = d"
equation "d326 = d"
equation "d327 = d"
equation "d328 = d"
equation "d329 = d"
equation "d330 = d"
equation "d331 = d"
equation "d332 = d"
equation "d333 = d"
equation "d334 = d"
equation "d335 = d"
equation "d336 = d"
equation "d337 = d"
equation "d338 = d"
equation "d339 = d"
equation "d340 = d"
equation "d341 = d"
equation "d342 = d"
equation "d343 = d"
equation "d344 = d"
equation "d345 = d"
equation "d346 = d"
equation "d347 = d"
equation "d348 = d"
equation "d349 = d"
equation "d350 = d"
equation "d351 = d"
equation "d352 = d"
equation "d353 = d"
equation "d354 = d"
equation "d355 = d"
equation "d356 = d"
equation "d357 = d"
equation "d358 = d"
equation "d359 = d"
equation "d360 = d"
equation "d361 = d"
equation "d362 = d"
equation "d363 = d"
equation "d364 = d"
equation "d365 = d"
equation "d366 = d"
equation "d367 = d"
equation "d368 = d"
equation "d369 = d"
equation "d370 = d"
equation "d371 = d"
equation "d372 = d"
equation "d373 = d"
equation "d374 = d"
equation "d375 = d"
equation "d376 = d"
equation "d377 = d"
equation "d378 = d"
equation "d379 = d"
equation "d380 = d"
equation "d381 = d"
equation "d382 = d"
equation "d383 = d"
equation "d384 = d"
equation "d385 = d"
equation "d386 = d"
equation "d387 = d"
equation "d388 = d"
equation "d389 = d"
equation "d390 = d"
equation "d391 = d"
equation "d392 = d"
equation "d393 = d"
equation "d394 = d"
equation "d395 = d"
equation "d396 = d"
equation "d397 = d"
equation "d398 = d"
equation "d399 = d"
equation "d400 = d"
equation "d401 = d"
equation "d402 = d"
equation "d403 = d"
equation "d404 = d"
equation "d405 = d"
equation "d406 = d"
equation "d407 = d"
equation "d408 = d"
equation "d409 = d"
equation "d410 = d"
equation "d411 = d"
equation "d412 = d"
equation "d413 = d"
equation "d414 = d"
equation "d415 = d"
equation "d416 = d"
equation "d417 = d"
equation "d418 = d"
equation "d419 = d"
equation "d420 = d"
equation "d421 = d"
equation "d422 = d"
equation "d423 = d"
equation "d424 = d"
equation "d425 = d"
equation "d426 = d"
equation "d427 = d"
equation "d428 = d"
equation "d429 = d"
equation "d430 = d"
equation "d431 = d"
equation "d432 = d"
equation "d433 = d"
equation "d434 = d"
